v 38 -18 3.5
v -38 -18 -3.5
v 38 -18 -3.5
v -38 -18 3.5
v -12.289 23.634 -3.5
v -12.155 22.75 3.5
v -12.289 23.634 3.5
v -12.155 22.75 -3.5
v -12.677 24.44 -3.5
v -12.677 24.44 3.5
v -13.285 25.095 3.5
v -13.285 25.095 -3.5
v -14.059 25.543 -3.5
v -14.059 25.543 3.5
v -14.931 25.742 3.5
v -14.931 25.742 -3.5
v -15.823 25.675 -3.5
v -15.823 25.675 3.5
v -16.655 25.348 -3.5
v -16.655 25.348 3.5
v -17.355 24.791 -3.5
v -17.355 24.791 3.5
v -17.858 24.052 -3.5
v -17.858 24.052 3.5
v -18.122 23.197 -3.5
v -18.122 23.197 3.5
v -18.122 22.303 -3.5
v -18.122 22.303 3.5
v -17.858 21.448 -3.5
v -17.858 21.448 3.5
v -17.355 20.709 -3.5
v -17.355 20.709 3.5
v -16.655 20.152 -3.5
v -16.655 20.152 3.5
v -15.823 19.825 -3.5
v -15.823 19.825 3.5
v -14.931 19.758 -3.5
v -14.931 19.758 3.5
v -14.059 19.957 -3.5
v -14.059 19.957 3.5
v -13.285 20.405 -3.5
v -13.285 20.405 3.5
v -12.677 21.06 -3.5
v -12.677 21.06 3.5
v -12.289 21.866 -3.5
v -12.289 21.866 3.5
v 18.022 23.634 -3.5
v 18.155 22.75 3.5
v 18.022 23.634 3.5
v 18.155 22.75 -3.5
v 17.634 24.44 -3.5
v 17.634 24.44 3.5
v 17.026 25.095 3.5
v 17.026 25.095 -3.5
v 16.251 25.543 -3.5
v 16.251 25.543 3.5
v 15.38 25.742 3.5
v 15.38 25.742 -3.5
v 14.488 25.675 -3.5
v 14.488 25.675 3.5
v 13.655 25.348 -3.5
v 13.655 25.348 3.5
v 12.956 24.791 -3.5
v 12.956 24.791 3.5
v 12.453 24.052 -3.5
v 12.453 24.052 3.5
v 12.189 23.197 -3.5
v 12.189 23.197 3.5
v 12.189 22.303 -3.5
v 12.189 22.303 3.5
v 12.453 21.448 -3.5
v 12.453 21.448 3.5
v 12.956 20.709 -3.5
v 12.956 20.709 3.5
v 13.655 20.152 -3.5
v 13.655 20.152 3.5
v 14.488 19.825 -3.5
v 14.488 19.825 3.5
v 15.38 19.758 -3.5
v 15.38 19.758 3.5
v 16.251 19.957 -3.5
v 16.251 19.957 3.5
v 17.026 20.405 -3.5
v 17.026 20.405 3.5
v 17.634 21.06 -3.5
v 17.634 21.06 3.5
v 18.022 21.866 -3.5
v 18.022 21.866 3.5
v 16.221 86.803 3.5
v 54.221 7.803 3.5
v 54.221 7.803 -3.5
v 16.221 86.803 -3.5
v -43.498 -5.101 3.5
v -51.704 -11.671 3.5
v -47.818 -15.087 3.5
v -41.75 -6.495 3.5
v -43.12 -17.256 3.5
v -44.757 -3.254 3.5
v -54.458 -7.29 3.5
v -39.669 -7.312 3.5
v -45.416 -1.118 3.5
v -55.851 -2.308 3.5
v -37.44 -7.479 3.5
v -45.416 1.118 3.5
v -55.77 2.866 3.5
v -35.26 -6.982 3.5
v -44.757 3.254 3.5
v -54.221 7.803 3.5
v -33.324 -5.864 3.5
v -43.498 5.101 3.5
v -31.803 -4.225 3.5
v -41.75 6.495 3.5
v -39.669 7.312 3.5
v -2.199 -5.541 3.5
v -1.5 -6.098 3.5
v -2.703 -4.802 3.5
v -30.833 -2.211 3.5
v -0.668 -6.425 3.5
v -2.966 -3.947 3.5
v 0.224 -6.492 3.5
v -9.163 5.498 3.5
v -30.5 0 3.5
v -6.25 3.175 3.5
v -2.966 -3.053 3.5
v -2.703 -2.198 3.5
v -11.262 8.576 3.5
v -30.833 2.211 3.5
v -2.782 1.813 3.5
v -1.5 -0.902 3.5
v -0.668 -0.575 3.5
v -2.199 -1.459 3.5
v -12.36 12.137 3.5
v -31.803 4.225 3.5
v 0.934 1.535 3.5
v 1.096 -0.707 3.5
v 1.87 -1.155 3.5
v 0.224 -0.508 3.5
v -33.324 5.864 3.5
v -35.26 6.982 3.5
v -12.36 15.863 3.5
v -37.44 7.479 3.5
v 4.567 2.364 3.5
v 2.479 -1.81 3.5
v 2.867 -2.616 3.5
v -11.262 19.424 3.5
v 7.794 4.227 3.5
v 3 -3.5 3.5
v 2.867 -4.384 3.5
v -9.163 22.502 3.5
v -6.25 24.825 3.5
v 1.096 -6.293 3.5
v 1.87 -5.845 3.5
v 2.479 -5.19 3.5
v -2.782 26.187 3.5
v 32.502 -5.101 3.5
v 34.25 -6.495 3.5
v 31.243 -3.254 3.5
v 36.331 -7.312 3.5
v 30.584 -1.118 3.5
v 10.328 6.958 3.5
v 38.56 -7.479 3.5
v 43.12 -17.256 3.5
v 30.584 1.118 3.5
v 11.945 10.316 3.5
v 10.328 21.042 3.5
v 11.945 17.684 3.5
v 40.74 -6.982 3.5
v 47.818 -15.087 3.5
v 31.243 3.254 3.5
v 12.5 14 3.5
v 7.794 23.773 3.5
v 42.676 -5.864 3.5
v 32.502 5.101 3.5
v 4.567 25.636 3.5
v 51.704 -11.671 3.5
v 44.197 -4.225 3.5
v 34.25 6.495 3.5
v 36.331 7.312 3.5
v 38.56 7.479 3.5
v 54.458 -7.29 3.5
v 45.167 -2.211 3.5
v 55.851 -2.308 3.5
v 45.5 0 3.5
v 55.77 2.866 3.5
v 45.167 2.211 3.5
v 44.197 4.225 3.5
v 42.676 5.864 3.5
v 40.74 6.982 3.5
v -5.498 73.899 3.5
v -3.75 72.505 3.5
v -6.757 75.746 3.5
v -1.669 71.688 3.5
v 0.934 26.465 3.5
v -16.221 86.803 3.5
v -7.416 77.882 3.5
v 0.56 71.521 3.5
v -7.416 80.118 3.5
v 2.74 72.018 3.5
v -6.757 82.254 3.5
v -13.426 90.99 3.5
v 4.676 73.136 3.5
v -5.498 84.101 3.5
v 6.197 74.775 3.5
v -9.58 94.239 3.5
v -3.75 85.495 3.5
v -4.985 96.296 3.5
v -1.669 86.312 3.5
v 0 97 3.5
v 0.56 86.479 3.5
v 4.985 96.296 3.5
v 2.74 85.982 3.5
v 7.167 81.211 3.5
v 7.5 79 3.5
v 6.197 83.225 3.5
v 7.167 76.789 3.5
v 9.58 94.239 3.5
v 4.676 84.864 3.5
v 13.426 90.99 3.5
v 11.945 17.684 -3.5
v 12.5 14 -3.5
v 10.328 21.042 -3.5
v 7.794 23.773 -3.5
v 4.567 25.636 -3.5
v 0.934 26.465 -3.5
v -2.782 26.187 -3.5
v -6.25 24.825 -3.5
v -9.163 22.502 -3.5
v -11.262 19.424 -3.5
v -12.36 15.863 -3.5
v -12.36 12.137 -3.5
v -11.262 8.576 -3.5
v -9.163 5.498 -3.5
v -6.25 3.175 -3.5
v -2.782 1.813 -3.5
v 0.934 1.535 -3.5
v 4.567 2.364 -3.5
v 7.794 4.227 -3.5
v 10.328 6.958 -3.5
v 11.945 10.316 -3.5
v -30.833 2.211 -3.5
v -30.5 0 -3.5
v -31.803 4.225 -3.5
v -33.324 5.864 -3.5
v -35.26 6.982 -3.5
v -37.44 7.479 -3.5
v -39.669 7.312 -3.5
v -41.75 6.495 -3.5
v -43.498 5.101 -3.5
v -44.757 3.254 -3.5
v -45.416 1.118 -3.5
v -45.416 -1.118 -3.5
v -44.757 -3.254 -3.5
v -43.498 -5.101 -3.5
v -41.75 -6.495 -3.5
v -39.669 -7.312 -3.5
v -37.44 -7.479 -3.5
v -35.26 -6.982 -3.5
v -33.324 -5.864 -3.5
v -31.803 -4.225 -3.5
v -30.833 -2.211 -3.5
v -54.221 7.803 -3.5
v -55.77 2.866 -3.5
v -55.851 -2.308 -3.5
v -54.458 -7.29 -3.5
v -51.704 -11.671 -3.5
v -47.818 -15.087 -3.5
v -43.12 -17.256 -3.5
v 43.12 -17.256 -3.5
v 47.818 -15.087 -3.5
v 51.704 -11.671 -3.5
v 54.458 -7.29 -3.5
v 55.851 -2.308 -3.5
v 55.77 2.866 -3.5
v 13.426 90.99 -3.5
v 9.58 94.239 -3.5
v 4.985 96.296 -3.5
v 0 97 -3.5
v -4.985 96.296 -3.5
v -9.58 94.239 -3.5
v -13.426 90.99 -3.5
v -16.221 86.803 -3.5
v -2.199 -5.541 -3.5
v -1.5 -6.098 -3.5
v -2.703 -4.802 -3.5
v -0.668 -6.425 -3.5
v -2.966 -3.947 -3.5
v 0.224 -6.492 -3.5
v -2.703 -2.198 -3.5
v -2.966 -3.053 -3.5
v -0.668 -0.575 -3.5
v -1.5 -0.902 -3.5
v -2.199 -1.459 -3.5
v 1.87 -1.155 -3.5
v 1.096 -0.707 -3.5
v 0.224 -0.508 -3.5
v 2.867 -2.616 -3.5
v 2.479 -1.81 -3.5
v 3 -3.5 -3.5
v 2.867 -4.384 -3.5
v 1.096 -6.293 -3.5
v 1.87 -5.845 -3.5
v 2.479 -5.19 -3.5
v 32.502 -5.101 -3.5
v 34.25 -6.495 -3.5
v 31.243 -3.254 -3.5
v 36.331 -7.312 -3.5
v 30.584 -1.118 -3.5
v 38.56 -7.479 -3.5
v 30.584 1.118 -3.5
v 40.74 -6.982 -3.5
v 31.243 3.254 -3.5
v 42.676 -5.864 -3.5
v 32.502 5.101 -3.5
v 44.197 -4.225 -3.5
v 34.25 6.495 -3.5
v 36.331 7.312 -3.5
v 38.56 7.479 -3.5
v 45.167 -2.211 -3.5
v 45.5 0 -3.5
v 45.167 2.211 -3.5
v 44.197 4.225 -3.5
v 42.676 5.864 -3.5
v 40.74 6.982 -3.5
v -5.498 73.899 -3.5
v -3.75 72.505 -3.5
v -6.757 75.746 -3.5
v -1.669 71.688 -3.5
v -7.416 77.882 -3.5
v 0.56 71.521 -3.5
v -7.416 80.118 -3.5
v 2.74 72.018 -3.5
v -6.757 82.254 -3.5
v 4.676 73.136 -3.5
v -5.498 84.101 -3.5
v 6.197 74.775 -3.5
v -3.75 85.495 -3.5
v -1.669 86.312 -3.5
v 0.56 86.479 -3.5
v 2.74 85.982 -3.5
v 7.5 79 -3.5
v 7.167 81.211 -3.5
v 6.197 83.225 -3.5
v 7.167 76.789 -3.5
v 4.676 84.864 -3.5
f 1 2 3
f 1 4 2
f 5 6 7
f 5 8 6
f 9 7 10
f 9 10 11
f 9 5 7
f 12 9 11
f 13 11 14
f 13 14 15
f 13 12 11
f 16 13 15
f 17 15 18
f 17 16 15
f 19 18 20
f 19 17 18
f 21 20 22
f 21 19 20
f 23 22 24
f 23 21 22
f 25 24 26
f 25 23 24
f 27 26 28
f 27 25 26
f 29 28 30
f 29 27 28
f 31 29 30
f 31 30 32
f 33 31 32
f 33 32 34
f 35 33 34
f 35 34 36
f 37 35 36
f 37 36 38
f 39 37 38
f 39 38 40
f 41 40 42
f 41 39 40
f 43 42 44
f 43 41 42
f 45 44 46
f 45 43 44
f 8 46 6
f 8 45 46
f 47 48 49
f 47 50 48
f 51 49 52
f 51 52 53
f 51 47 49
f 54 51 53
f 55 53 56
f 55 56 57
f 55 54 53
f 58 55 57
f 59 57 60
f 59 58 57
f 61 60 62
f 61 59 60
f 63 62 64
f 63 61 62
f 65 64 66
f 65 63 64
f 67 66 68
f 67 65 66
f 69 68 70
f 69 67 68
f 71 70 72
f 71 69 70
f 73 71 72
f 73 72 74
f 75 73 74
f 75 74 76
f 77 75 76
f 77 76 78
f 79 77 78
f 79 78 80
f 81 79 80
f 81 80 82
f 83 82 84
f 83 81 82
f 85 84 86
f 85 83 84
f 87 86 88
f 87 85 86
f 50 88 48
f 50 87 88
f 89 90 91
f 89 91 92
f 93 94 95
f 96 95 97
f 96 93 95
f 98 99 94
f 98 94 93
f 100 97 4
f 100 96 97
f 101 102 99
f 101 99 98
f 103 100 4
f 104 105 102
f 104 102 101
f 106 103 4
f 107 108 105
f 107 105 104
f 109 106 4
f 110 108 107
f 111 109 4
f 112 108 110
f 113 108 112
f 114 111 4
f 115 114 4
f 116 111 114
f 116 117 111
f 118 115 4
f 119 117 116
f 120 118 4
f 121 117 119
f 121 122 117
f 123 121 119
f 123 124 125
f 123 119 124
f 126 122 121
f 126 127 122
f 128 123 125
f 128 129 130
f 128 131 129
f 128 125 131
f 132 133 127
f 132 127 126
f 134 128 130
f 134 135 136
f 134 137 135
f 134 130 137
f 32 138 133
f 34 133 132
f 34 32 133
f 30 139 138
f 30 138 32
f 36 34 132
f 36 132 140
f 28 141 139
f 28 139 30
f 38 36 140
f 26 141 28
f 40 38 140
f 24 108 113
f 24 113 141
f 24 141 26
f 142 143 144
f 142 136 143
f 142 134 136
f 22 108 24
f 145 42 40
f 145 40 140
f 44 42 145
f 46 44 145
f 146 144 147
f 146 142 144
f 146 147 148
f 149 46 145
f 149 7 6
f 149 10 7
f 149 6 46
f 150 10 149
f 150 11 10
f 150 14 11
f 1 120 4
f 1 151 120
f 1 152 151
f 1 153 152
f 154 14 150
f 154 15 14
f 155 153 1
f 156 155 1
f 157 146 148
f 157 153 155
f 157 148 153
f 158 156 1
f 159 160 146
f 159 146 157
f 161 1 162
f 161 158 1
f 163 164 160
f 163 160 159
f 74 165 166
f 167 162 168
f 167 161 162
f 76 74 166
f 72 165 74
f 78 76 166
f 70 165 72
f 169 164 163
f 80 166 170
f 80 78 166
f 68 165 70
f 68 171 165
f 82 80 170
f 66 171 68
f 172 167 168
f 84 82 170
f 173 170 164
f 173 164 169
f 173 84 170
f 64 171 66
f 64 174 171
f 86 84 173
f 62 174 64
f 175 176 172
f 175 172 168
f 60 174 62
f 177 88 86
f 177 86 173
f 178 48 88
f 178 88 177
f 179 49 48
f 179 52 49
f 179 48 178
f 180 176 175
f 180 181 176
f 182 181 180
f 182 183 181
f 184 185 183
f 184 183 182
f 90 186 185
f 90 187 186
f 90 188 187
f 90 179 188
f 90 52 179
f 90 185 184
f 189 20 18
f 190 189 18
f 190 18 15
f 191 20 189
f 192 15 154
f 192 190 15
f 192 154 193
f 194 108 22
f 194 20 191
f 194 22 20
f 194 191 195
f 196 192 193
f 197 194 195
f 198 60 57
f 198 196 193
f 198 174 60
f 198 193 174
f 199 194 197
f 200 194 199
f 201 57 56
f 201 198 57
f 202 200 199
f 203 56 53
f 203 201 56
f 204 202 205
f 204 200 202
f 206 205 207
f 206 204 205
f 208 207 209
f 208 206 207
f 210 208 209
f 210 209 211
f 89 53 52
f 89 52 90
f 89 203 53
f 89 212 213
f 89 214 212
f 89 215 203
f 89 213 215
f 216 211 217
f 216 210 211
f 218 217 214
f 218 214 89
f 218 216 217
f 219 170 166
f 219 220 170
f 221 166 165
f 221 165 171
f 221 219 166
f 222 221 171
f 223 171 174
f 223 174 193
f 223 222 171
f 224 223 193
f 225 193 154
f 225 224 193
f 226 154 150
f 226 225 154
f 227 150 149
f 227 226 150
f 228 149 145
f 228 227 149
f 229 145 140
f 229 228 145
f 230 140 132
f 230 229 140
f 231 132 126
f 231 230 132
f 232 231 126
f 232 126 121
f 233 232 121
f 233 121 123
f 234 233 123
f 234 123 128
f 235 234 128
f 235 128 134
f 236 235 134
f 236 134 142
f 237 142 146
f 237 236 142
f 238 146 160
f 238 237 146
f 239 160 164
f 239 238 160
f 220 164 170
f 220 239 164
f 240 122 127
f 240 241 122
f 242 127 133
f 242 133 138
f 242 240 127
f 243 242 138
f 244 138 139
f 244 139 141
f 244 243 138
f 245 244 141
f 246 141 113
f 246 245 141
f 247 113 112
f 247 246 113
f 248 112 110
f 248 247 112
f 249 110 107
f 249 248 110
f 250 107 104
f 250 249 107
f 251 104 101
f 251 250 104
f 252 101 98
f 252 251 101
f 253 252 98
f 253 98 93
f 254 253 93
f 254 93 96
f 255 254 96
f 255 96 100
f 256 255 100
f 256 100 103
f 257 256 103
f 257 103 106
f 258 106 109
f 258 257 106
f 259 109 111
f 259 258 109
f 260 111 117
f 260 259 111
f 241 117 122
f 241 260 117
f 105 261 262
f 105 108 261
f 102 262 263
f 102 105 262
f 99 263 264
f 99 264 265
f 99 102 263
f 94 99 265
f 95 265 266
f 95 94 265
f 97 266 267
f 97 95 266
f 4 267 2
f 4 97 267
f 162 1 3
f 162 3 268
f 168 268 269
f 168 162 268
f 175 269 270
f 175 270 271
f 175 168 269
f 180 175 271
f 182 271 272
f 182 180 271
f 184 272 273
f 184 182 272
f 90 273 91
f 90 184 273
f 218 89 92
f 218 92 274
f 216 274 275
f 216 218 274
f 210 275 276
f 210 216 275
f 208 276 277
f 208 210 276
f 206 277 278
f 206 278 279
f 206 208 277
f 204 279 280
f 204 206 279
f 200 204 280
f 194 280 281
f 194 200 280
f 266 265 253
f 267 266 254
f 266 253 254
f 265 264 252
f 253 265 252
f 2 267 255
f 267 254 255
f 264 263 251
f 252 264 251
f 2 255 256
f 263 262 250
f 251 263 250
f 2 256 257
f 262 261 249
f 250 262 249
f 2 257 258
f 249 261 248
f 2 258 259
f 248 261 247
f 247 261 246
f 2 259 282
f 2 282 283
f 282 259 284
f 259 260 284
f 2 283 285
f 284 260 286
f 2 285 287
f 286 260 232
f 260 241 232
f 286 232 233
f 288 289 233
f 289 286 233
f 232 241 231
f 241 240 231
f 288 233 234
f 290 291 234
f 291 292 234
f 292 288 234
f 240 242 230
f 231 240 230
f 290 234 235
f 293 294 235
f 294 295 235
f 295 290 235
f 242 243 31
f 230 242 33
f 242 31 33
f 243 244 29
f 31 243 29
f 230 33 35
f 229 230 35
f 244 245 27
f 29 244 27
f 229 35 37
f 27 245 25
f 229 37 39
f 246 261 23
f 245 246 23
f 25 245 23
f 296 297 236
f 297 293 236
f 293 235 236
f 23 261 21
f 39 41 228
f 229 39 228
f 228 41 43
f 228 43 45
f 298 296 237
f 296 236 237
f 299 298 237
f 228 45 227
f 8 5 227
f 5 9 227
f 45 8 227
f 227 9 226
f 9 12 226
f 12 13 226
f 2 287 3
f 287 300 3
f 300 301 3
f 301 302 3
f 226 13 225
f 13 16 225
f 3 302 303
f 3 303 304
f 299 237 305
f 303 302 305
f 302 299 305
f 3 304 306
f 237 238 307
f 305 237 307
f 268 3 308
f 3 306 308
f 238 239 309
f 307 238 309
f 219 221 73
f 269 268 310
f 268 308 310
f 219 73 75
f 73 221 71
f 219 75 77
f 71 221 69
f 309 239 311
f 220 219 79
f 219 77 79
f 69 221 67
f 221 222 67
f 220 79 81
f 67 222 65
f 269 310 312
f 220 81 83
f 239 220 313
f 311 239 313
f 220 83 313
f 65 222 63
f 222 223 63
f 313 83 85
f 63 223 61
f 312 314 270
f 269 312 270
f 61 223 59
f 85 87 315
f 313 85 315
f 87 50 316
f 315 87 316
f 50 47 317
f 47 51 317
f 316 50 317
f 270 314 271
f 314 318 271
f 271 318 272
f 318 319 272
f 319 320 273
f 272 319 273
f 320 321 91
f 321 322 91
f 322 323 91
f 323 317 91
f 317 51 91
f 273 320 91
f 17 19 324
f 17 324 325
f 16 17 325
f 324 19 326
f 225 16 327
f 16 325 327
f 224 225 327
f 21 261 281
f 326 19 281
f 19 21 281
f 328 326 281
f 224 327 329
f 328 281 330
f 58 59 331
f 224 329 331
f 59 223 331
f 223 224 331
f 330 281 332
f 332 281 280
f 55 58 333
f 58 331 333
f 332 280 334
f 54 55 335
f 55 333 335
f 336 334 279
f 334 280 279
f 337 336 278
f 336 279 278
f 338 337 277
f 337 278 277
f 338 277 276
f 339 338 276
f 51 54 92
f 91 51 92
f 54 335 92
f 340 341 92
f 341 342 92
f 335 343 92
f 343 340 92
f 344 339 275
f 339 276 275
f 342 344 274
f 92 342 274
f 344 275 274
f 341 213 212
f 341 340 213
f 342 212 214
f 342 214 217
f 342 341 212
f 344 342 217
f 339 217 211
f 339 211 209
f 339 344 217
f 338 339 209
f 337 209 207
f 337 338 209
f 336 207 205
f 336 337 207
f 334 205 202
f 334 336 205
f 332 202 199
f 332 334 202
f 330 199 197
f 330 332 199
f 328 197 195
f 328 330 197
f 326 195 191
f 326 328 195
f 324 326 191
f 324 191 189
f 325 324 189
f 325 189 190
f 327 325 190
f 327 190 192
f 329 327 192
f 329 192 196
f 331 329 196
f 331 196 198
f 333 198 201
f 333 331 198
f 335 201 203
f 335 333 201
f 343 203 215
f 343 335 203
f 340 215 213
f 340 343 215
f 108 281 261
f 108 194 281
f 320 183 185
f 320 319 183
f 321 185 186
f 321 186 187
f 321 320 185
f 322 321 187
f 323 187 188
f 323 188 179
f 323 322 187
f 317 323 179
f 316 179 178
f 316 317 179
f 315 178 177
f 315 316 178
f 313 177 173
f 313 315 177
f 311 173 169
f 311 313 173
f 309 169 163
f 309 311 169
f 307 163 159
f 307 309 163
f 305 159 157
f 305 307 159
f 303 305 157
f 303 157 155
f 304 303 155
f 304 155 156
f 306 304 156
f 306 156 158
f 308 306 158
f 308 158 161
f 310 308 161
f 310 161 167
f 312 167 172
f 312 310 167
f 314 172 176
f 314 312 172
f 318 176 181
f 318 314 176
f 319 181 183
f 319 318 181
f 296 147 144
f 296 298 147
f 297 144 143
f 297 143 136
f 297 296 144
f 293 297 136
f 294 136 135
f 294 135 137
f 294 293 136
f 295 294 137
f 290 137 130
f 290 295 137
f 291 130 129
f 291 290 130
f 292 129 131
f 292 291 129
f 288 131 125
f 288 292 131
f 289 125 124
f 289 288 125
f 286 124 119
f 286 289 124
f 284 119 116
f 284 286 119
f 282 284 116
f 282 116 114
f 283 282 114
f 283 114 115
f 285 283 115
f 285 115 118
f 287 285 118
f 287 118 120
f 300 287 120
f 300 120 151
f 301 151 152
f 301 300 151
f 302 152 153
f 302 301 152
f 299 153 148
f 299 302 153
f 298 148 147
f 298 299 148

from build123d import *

# Parameters (mm, degrees)
SKETCH1_R           = 7.5
SKETCH1_R_2         = 12.5
SKETCH1_R_3         = 3
BOSS_EXTRUDE1_DEPTH = 3.5


with BuildPart() as part:
    # Sketch1 → Boss-Extrude1 (new body, symmetric)
    with BuildSketch(Plane.XY):
        with BuildLine():
            Line((-38, -18), (38, -18))
            ThreePointArc((38, -18), (53.238850443, -9.580054133), (54.221001351, 7.802506979))
            Line((54.221001351, 7.802506979), (16.221001351, 86.802506979))
            ThreePointArc((16.221001351, 86.802506979), (0, 97), (-16.221001351, 86.802506979))
            Line((-16.221001351, 86.802506979), (-54.221001351, 7.802506979))
            ThreePointArc((-54.221001351, 7.802506979), (-53.238850443, -9.580054133), (-38, -18))
        make_face()
        with Locations((-38, 0)):
            Circle(SKETCH1_R, mode=Mode.SUBTRACT)
        with Locations((38, 0)):
            Circle(SKETCH1_R, mode=Mode.SUBTRACT)
        with Locations((0, 14)):
            Circle(SKETCH1_R_2, mode=Mode.SUBTRACT)
        with Locations((-15.155444566, 22.75)):
            Circle(SKETCH1_R_3, mode=Mode.SUBTRACT)
        with Locations((0, -3.5)):
            Circle(SKETCH1_R_3, mode=Mode.SUBTRACT)
        with Locations((15.155444566, 22.75)):
            Circle(SKETCH1_R_3, mode=Mode.SUBTRACT)
        with Locations((0, 79)):
            Circle(SKETCH1_R, mode=Mode.SUBTRACT)
    extrude(amount=BOSS_EXTRUDE1_DEPTH, both=True)


solid = part.part
